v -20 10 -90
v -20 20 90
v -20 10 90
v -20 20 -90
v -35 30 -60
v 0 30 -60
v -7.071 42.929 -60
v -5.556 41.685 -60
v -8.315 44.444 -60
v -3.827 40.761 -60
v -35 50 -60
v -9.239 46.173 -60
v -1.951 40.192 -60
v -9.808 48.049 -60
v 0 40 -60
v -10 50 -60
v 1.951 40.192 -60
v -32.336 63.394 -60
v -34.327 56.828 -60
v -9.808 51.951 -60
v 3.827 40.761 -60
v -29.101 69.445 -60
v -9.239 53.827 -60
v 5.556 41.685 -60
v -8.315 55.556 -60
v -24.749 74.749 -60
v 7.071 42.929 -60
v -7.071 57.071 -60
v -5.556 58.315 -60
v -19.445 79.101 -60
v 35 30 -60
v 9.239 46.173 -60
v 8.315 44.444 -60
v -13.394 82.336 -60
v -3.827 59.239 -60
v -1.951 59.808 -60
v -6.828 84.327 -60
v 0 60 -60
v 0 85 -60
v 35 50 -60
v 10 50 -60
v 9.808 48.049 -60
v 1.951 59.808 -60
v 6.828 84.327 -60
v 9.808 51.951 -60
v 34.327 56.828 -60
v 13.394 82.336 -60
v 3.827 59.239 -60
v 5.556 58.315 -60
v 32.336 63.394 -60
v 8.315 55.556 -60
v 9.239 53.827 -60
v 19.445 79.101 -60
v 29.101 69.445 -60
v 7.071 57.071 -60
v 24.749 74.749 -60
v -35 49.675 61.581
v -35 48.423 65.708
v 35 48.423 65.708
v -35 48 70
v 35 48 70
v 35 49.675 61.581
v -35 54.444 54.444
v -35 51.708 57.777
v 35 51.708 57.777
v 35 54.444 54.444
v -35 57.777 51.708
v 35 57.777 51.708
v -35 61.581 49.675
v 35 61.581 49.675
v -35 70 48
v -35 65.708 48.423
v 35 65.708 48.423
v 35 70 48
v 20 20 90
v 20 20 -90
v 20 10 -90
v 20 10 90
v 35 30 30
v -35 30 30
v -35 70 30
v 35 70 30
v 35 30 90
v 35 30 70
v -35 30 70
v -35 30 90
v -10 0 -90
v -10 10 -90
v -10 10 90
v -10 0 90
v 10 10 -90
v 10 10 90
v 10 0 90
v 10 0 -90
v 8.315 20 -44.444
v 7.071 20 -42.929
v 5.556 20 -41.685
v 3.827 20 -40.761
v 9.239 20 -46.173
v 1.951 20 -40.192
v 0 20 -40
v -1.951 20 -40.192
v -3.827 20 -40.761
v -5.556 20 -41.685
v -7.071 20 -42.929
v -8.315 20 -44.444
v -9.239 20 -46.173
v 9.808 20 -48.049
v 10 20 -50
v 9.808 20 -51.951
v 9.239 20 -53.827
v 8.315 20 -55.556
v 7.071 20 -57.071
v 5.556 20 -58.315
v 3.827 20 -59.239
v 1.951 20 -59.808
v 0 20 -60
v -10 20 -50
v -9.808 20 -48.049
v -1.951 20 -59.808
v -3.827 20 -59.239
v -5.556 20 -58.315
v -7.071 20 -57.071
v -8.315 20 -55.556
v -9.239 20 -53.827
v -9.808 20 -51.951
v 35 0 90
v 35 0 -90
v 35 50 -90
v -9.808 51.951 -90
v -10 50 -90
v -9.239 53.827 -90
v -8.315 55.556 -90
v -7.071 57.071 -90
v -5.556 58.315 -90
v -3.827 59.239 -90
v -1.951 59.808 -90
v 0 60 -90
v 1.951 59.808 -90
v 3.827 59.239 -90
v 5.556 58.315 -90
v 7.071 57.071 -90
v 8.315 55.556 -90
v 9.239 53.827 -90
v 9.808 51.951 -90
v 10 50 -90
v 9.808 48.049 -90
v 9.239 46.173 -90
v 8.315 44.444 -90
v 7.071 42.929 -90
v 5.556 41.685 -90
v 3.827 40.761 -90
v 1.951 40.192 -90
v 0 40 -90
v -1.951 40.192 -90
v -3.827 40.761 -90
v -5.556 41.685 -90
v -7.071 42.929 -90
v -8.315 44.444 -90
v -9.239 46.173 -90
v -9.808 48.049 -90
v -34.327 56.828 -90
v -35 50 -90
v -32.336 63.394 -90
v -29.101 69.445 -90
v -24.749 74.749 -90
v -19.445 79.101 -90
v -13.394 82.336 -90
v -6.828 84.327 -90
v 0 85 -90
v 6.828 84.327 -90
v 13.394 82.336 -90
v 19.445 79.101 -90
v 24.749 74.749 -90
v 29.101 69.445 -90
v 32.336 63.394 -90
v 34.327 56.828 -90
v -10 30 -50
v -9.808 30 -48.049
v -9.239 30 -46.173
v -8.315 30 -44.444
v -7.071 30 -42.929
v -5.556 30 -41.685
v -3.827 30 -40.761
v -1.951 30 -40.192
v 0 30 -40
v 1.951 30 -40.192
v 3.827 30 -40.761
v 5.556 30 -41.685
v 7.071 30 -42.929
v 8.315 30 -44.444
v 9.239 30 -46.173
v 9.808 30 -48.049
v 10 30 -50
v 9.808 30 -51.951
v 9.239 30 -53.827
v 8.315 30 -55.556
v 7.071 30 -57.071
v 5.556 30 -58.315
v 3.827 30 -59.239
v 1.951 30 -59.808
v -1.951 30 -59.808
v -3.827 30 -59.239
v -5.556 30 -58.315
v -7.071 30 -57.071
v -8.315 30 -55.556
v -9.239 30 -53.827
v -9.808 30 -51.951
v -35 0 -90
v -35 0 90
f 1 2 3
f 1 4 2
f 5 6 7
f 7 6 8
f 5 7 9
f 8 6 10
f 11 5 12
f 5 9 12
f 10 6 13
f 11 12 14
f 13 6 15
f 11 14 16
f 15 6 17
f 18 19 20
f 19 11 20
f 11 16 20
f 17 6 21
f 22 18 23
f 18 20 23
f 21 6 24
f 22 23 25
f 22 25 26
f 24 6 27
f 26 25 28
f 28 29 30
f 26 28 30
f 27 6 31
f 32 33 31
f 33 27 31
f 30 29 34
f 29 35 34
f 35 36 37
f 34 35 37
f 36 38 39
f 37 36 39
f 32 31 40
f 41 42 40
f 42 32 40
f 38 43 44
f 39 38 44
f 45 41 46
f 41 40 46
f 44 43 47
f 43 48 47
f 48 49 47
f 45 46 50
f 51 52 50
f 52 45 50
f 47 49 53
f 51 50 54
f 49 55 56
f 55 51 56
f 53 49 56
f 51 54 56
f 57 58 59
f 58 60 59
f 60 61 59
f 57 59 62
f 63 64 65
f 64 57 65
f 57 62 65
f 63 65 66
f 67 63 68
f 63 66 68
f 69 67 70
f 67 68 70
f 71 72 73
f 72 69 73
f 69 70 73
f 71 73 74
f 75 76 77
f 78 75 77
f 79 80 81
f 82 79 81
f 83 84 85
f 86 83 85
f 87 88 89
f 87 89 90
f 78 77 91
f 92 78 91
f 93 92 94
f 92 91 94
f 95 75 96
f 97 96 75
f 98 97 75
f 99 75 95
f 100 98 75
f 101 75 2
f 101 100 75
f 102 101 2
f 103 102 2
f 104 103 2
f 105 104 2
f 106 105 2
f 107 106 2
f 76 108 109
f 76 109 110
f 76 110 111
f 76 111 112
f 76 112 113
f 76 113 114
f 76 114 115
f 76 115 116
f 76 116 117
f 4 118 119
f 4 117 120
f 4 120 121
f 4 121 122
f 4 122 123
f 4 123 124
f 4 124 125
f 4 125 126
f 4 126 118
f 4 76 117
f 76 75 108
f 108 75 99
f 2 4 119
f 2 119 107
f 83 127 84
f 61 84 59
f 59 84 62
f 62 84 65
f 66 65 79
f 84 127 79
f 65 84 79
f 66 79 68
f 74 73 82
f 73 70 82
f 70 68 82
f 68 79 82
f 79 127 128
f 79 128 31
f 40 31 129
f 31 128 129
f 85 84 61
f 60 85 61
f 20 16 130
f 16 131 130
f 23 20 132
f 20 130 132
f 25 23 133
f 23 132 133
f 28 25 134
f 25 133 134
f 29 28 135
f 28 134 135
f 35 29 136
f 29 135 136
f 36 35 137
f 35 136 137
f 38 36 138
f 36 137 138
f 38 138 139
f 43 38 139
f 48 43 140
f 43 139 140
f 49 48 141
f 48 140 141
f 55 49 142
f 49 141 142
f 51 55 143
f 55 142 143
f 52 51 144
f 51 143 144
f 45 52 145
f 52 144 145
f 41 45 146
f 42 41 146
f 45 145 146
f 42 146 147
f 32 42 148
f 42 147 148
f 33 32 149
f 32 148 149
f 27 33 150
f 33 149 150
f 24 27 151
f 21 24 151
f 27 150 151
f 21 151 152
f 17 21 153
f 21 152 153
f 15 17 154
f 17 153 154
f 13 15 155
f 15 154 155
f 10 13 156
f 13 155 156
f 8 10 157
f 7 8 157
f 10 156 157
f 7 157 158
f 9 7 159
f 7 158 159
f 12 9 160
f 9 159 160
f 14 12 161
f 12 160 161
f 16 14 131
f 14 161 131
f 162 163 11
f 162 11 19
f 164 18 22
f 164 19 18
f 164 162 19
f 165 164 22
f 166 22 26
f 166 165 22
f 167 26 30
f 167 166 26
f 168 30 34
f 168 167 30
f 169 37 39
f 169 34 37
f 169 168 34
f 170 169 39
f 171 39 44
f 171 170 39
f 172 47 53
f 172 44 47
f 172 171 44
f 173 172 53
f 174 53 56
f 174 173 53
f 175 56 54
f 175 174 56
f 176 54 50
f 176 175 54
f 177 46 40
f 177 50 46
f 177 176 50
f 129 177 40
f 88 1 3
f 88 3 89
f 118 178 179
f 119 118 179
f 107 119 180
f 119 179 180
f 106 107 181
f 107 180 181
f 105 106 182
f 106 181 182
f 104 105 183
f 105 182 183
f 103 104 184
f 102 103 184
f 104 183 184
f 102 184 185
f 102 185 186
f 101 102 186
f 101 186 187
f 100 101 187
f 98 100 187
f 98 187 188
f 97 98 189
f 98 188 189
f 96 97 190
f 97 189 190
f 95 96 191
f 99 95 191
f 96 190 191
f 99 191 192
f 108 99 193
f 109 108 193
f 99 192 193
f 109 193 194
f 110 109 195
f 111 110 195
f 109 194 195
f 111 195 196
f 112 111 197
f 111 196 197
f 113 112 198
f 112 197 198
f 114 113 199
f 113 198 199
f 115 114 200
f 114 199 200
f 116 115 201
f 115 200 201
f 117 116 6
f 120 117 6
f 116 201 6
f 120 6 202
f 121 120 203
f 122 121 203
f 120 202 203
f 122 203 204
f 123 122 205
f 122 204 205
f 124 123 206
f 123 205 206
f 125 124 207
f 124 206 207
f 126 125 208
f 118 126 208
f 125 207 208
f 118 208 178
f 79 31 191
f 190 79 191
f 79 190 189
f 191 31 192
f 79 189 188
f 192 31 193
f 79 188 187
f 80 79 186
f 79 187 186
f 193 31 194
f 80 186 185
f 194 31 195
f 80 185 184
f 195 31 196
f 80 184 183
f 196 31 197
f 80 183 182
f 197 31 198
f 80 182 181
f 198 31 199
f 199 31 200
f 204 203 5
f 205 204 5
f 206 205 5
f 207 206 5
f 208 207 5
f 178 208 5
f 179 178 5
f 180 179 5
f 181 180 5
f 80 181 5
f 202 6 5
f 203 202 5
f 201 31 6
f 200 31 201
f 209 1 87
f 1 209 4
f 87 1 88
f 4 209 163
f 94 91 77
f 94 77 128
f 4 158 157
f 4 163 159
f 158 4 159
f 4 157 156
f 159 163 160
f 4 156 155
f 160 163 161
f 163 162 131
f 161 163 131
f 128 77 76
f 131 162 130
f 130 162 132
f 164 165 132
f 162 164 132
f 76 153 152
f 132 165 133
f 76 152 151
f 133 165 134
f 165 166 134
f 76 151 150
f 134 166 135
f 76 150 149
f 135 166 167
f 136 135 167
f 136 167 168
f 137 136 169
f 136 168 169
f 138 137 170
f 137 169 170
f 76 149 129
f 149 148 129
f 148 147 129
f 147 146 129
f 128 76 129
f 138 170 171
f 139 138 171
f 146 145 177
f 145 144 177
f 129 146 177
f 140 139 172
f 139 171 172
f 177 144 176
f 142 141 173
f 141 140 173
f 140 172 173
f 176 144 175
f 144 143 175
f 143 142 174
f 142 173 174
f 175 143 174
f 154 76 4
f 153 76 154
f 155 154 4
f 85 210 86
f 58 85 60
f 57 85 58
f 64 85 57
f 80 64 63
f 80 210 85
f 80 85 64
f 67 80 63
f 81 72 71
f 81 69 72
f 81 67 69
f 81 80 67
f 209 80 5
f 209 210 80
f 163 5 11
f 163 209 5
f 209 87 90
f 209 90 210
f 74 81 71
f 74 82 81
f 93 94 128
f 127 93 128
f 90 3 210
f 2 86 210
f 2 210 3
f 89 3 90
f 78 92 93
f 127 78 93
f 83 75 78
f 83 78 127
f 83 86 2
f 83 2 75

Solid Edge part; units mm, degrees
sketch "Sketch1" plane through (0, 0, 0) normal (0, 0, 1) x (1, 0, 0)
  line L0 (35, 0) -> (35, 30)
  line L1 (35, 30) -> (0, 30)
  line L2 (-35, 30) -> (0, 30)
  line L3 (-35, 0) -> (-35, 30)
  line L4 (-10, 0) -> (-35, 0)
  line L5 (-10, 10) -> (-10, 0)
  line L6 (-20, 10) -> (-10, 10)
  line L7 (-20, 20) -> (-20, 10)
  line L8 (0, 20) -> (-20, 20)
  line L9 (0, 20) -> (20, 20)
  line L10 (20, 20) -> (20, 10)
  line L11 (20, 10) -> (10, 10)
  line L12 (10, 10) -> (10, 0)
  line L13 (10, 0) -> (35, 0)
extrude "Protrusion1" add sketch "Sketch1" along normal mid plane 180
sketch "Sketch2" plane through (35, 15, 0) normal (1, 0, 0) x (0, 0, -1)
  line L0 (-70, 15) -> (-70, 33)
  line L1 (-70, 15) -> (-30, 15)
  line L2 (-30, 15) -> (-30, 55)
  line L3 (-30, 55) -> (-48, 55)
  arc A0 (-48, 55) -> (-70, 33) centre (-70, 55) cw
  line L4 (60, 15) -> (60, 35)
  line L5 (60, 35) -> (90, 35)
  line L6 (90, 35) -> (90, 15)
  line L7 (90, 15) -> (60, 15)
extrude "ExtrudedProtrusion_4" add sketch "Sketch2" against normal blind 70
sketch "Sketch3" plane through (0, 25, -90) normal (0, 0, -1) x (-1, 0, 0)
  circle A0 centre (0, 25) radius 10
extrude "ExtrudedCutout_3" cut sketch "Sketch3" against normal blind 30
sketch "Sketch4" plane through (0, 25, -90) normal (0, 0, -1) x (-1, 0, 0)
  line L0 (10, 25) -> (35, 25)
  line L1 (-35, 25) -> (-10, 25)
  arc A0 (-35, 25) -> (35, 25) centre (0, 25) cw
  arc A1 (-10, 25) -> (10, 25) centre (0, 25) cw
extrude "ExtrudedProtrusion_5" add sketch "Sketch4" against normal blind 30
sketch "Sketch5" plane through (0, 30, -15) normal (0, 1, 0) x (-1, 0, 0)
  circle A0 centre (0, -35) radius 10
extrude "ExtrudedCutout_4" cut sketch "Sketch5" against normal blind 30
